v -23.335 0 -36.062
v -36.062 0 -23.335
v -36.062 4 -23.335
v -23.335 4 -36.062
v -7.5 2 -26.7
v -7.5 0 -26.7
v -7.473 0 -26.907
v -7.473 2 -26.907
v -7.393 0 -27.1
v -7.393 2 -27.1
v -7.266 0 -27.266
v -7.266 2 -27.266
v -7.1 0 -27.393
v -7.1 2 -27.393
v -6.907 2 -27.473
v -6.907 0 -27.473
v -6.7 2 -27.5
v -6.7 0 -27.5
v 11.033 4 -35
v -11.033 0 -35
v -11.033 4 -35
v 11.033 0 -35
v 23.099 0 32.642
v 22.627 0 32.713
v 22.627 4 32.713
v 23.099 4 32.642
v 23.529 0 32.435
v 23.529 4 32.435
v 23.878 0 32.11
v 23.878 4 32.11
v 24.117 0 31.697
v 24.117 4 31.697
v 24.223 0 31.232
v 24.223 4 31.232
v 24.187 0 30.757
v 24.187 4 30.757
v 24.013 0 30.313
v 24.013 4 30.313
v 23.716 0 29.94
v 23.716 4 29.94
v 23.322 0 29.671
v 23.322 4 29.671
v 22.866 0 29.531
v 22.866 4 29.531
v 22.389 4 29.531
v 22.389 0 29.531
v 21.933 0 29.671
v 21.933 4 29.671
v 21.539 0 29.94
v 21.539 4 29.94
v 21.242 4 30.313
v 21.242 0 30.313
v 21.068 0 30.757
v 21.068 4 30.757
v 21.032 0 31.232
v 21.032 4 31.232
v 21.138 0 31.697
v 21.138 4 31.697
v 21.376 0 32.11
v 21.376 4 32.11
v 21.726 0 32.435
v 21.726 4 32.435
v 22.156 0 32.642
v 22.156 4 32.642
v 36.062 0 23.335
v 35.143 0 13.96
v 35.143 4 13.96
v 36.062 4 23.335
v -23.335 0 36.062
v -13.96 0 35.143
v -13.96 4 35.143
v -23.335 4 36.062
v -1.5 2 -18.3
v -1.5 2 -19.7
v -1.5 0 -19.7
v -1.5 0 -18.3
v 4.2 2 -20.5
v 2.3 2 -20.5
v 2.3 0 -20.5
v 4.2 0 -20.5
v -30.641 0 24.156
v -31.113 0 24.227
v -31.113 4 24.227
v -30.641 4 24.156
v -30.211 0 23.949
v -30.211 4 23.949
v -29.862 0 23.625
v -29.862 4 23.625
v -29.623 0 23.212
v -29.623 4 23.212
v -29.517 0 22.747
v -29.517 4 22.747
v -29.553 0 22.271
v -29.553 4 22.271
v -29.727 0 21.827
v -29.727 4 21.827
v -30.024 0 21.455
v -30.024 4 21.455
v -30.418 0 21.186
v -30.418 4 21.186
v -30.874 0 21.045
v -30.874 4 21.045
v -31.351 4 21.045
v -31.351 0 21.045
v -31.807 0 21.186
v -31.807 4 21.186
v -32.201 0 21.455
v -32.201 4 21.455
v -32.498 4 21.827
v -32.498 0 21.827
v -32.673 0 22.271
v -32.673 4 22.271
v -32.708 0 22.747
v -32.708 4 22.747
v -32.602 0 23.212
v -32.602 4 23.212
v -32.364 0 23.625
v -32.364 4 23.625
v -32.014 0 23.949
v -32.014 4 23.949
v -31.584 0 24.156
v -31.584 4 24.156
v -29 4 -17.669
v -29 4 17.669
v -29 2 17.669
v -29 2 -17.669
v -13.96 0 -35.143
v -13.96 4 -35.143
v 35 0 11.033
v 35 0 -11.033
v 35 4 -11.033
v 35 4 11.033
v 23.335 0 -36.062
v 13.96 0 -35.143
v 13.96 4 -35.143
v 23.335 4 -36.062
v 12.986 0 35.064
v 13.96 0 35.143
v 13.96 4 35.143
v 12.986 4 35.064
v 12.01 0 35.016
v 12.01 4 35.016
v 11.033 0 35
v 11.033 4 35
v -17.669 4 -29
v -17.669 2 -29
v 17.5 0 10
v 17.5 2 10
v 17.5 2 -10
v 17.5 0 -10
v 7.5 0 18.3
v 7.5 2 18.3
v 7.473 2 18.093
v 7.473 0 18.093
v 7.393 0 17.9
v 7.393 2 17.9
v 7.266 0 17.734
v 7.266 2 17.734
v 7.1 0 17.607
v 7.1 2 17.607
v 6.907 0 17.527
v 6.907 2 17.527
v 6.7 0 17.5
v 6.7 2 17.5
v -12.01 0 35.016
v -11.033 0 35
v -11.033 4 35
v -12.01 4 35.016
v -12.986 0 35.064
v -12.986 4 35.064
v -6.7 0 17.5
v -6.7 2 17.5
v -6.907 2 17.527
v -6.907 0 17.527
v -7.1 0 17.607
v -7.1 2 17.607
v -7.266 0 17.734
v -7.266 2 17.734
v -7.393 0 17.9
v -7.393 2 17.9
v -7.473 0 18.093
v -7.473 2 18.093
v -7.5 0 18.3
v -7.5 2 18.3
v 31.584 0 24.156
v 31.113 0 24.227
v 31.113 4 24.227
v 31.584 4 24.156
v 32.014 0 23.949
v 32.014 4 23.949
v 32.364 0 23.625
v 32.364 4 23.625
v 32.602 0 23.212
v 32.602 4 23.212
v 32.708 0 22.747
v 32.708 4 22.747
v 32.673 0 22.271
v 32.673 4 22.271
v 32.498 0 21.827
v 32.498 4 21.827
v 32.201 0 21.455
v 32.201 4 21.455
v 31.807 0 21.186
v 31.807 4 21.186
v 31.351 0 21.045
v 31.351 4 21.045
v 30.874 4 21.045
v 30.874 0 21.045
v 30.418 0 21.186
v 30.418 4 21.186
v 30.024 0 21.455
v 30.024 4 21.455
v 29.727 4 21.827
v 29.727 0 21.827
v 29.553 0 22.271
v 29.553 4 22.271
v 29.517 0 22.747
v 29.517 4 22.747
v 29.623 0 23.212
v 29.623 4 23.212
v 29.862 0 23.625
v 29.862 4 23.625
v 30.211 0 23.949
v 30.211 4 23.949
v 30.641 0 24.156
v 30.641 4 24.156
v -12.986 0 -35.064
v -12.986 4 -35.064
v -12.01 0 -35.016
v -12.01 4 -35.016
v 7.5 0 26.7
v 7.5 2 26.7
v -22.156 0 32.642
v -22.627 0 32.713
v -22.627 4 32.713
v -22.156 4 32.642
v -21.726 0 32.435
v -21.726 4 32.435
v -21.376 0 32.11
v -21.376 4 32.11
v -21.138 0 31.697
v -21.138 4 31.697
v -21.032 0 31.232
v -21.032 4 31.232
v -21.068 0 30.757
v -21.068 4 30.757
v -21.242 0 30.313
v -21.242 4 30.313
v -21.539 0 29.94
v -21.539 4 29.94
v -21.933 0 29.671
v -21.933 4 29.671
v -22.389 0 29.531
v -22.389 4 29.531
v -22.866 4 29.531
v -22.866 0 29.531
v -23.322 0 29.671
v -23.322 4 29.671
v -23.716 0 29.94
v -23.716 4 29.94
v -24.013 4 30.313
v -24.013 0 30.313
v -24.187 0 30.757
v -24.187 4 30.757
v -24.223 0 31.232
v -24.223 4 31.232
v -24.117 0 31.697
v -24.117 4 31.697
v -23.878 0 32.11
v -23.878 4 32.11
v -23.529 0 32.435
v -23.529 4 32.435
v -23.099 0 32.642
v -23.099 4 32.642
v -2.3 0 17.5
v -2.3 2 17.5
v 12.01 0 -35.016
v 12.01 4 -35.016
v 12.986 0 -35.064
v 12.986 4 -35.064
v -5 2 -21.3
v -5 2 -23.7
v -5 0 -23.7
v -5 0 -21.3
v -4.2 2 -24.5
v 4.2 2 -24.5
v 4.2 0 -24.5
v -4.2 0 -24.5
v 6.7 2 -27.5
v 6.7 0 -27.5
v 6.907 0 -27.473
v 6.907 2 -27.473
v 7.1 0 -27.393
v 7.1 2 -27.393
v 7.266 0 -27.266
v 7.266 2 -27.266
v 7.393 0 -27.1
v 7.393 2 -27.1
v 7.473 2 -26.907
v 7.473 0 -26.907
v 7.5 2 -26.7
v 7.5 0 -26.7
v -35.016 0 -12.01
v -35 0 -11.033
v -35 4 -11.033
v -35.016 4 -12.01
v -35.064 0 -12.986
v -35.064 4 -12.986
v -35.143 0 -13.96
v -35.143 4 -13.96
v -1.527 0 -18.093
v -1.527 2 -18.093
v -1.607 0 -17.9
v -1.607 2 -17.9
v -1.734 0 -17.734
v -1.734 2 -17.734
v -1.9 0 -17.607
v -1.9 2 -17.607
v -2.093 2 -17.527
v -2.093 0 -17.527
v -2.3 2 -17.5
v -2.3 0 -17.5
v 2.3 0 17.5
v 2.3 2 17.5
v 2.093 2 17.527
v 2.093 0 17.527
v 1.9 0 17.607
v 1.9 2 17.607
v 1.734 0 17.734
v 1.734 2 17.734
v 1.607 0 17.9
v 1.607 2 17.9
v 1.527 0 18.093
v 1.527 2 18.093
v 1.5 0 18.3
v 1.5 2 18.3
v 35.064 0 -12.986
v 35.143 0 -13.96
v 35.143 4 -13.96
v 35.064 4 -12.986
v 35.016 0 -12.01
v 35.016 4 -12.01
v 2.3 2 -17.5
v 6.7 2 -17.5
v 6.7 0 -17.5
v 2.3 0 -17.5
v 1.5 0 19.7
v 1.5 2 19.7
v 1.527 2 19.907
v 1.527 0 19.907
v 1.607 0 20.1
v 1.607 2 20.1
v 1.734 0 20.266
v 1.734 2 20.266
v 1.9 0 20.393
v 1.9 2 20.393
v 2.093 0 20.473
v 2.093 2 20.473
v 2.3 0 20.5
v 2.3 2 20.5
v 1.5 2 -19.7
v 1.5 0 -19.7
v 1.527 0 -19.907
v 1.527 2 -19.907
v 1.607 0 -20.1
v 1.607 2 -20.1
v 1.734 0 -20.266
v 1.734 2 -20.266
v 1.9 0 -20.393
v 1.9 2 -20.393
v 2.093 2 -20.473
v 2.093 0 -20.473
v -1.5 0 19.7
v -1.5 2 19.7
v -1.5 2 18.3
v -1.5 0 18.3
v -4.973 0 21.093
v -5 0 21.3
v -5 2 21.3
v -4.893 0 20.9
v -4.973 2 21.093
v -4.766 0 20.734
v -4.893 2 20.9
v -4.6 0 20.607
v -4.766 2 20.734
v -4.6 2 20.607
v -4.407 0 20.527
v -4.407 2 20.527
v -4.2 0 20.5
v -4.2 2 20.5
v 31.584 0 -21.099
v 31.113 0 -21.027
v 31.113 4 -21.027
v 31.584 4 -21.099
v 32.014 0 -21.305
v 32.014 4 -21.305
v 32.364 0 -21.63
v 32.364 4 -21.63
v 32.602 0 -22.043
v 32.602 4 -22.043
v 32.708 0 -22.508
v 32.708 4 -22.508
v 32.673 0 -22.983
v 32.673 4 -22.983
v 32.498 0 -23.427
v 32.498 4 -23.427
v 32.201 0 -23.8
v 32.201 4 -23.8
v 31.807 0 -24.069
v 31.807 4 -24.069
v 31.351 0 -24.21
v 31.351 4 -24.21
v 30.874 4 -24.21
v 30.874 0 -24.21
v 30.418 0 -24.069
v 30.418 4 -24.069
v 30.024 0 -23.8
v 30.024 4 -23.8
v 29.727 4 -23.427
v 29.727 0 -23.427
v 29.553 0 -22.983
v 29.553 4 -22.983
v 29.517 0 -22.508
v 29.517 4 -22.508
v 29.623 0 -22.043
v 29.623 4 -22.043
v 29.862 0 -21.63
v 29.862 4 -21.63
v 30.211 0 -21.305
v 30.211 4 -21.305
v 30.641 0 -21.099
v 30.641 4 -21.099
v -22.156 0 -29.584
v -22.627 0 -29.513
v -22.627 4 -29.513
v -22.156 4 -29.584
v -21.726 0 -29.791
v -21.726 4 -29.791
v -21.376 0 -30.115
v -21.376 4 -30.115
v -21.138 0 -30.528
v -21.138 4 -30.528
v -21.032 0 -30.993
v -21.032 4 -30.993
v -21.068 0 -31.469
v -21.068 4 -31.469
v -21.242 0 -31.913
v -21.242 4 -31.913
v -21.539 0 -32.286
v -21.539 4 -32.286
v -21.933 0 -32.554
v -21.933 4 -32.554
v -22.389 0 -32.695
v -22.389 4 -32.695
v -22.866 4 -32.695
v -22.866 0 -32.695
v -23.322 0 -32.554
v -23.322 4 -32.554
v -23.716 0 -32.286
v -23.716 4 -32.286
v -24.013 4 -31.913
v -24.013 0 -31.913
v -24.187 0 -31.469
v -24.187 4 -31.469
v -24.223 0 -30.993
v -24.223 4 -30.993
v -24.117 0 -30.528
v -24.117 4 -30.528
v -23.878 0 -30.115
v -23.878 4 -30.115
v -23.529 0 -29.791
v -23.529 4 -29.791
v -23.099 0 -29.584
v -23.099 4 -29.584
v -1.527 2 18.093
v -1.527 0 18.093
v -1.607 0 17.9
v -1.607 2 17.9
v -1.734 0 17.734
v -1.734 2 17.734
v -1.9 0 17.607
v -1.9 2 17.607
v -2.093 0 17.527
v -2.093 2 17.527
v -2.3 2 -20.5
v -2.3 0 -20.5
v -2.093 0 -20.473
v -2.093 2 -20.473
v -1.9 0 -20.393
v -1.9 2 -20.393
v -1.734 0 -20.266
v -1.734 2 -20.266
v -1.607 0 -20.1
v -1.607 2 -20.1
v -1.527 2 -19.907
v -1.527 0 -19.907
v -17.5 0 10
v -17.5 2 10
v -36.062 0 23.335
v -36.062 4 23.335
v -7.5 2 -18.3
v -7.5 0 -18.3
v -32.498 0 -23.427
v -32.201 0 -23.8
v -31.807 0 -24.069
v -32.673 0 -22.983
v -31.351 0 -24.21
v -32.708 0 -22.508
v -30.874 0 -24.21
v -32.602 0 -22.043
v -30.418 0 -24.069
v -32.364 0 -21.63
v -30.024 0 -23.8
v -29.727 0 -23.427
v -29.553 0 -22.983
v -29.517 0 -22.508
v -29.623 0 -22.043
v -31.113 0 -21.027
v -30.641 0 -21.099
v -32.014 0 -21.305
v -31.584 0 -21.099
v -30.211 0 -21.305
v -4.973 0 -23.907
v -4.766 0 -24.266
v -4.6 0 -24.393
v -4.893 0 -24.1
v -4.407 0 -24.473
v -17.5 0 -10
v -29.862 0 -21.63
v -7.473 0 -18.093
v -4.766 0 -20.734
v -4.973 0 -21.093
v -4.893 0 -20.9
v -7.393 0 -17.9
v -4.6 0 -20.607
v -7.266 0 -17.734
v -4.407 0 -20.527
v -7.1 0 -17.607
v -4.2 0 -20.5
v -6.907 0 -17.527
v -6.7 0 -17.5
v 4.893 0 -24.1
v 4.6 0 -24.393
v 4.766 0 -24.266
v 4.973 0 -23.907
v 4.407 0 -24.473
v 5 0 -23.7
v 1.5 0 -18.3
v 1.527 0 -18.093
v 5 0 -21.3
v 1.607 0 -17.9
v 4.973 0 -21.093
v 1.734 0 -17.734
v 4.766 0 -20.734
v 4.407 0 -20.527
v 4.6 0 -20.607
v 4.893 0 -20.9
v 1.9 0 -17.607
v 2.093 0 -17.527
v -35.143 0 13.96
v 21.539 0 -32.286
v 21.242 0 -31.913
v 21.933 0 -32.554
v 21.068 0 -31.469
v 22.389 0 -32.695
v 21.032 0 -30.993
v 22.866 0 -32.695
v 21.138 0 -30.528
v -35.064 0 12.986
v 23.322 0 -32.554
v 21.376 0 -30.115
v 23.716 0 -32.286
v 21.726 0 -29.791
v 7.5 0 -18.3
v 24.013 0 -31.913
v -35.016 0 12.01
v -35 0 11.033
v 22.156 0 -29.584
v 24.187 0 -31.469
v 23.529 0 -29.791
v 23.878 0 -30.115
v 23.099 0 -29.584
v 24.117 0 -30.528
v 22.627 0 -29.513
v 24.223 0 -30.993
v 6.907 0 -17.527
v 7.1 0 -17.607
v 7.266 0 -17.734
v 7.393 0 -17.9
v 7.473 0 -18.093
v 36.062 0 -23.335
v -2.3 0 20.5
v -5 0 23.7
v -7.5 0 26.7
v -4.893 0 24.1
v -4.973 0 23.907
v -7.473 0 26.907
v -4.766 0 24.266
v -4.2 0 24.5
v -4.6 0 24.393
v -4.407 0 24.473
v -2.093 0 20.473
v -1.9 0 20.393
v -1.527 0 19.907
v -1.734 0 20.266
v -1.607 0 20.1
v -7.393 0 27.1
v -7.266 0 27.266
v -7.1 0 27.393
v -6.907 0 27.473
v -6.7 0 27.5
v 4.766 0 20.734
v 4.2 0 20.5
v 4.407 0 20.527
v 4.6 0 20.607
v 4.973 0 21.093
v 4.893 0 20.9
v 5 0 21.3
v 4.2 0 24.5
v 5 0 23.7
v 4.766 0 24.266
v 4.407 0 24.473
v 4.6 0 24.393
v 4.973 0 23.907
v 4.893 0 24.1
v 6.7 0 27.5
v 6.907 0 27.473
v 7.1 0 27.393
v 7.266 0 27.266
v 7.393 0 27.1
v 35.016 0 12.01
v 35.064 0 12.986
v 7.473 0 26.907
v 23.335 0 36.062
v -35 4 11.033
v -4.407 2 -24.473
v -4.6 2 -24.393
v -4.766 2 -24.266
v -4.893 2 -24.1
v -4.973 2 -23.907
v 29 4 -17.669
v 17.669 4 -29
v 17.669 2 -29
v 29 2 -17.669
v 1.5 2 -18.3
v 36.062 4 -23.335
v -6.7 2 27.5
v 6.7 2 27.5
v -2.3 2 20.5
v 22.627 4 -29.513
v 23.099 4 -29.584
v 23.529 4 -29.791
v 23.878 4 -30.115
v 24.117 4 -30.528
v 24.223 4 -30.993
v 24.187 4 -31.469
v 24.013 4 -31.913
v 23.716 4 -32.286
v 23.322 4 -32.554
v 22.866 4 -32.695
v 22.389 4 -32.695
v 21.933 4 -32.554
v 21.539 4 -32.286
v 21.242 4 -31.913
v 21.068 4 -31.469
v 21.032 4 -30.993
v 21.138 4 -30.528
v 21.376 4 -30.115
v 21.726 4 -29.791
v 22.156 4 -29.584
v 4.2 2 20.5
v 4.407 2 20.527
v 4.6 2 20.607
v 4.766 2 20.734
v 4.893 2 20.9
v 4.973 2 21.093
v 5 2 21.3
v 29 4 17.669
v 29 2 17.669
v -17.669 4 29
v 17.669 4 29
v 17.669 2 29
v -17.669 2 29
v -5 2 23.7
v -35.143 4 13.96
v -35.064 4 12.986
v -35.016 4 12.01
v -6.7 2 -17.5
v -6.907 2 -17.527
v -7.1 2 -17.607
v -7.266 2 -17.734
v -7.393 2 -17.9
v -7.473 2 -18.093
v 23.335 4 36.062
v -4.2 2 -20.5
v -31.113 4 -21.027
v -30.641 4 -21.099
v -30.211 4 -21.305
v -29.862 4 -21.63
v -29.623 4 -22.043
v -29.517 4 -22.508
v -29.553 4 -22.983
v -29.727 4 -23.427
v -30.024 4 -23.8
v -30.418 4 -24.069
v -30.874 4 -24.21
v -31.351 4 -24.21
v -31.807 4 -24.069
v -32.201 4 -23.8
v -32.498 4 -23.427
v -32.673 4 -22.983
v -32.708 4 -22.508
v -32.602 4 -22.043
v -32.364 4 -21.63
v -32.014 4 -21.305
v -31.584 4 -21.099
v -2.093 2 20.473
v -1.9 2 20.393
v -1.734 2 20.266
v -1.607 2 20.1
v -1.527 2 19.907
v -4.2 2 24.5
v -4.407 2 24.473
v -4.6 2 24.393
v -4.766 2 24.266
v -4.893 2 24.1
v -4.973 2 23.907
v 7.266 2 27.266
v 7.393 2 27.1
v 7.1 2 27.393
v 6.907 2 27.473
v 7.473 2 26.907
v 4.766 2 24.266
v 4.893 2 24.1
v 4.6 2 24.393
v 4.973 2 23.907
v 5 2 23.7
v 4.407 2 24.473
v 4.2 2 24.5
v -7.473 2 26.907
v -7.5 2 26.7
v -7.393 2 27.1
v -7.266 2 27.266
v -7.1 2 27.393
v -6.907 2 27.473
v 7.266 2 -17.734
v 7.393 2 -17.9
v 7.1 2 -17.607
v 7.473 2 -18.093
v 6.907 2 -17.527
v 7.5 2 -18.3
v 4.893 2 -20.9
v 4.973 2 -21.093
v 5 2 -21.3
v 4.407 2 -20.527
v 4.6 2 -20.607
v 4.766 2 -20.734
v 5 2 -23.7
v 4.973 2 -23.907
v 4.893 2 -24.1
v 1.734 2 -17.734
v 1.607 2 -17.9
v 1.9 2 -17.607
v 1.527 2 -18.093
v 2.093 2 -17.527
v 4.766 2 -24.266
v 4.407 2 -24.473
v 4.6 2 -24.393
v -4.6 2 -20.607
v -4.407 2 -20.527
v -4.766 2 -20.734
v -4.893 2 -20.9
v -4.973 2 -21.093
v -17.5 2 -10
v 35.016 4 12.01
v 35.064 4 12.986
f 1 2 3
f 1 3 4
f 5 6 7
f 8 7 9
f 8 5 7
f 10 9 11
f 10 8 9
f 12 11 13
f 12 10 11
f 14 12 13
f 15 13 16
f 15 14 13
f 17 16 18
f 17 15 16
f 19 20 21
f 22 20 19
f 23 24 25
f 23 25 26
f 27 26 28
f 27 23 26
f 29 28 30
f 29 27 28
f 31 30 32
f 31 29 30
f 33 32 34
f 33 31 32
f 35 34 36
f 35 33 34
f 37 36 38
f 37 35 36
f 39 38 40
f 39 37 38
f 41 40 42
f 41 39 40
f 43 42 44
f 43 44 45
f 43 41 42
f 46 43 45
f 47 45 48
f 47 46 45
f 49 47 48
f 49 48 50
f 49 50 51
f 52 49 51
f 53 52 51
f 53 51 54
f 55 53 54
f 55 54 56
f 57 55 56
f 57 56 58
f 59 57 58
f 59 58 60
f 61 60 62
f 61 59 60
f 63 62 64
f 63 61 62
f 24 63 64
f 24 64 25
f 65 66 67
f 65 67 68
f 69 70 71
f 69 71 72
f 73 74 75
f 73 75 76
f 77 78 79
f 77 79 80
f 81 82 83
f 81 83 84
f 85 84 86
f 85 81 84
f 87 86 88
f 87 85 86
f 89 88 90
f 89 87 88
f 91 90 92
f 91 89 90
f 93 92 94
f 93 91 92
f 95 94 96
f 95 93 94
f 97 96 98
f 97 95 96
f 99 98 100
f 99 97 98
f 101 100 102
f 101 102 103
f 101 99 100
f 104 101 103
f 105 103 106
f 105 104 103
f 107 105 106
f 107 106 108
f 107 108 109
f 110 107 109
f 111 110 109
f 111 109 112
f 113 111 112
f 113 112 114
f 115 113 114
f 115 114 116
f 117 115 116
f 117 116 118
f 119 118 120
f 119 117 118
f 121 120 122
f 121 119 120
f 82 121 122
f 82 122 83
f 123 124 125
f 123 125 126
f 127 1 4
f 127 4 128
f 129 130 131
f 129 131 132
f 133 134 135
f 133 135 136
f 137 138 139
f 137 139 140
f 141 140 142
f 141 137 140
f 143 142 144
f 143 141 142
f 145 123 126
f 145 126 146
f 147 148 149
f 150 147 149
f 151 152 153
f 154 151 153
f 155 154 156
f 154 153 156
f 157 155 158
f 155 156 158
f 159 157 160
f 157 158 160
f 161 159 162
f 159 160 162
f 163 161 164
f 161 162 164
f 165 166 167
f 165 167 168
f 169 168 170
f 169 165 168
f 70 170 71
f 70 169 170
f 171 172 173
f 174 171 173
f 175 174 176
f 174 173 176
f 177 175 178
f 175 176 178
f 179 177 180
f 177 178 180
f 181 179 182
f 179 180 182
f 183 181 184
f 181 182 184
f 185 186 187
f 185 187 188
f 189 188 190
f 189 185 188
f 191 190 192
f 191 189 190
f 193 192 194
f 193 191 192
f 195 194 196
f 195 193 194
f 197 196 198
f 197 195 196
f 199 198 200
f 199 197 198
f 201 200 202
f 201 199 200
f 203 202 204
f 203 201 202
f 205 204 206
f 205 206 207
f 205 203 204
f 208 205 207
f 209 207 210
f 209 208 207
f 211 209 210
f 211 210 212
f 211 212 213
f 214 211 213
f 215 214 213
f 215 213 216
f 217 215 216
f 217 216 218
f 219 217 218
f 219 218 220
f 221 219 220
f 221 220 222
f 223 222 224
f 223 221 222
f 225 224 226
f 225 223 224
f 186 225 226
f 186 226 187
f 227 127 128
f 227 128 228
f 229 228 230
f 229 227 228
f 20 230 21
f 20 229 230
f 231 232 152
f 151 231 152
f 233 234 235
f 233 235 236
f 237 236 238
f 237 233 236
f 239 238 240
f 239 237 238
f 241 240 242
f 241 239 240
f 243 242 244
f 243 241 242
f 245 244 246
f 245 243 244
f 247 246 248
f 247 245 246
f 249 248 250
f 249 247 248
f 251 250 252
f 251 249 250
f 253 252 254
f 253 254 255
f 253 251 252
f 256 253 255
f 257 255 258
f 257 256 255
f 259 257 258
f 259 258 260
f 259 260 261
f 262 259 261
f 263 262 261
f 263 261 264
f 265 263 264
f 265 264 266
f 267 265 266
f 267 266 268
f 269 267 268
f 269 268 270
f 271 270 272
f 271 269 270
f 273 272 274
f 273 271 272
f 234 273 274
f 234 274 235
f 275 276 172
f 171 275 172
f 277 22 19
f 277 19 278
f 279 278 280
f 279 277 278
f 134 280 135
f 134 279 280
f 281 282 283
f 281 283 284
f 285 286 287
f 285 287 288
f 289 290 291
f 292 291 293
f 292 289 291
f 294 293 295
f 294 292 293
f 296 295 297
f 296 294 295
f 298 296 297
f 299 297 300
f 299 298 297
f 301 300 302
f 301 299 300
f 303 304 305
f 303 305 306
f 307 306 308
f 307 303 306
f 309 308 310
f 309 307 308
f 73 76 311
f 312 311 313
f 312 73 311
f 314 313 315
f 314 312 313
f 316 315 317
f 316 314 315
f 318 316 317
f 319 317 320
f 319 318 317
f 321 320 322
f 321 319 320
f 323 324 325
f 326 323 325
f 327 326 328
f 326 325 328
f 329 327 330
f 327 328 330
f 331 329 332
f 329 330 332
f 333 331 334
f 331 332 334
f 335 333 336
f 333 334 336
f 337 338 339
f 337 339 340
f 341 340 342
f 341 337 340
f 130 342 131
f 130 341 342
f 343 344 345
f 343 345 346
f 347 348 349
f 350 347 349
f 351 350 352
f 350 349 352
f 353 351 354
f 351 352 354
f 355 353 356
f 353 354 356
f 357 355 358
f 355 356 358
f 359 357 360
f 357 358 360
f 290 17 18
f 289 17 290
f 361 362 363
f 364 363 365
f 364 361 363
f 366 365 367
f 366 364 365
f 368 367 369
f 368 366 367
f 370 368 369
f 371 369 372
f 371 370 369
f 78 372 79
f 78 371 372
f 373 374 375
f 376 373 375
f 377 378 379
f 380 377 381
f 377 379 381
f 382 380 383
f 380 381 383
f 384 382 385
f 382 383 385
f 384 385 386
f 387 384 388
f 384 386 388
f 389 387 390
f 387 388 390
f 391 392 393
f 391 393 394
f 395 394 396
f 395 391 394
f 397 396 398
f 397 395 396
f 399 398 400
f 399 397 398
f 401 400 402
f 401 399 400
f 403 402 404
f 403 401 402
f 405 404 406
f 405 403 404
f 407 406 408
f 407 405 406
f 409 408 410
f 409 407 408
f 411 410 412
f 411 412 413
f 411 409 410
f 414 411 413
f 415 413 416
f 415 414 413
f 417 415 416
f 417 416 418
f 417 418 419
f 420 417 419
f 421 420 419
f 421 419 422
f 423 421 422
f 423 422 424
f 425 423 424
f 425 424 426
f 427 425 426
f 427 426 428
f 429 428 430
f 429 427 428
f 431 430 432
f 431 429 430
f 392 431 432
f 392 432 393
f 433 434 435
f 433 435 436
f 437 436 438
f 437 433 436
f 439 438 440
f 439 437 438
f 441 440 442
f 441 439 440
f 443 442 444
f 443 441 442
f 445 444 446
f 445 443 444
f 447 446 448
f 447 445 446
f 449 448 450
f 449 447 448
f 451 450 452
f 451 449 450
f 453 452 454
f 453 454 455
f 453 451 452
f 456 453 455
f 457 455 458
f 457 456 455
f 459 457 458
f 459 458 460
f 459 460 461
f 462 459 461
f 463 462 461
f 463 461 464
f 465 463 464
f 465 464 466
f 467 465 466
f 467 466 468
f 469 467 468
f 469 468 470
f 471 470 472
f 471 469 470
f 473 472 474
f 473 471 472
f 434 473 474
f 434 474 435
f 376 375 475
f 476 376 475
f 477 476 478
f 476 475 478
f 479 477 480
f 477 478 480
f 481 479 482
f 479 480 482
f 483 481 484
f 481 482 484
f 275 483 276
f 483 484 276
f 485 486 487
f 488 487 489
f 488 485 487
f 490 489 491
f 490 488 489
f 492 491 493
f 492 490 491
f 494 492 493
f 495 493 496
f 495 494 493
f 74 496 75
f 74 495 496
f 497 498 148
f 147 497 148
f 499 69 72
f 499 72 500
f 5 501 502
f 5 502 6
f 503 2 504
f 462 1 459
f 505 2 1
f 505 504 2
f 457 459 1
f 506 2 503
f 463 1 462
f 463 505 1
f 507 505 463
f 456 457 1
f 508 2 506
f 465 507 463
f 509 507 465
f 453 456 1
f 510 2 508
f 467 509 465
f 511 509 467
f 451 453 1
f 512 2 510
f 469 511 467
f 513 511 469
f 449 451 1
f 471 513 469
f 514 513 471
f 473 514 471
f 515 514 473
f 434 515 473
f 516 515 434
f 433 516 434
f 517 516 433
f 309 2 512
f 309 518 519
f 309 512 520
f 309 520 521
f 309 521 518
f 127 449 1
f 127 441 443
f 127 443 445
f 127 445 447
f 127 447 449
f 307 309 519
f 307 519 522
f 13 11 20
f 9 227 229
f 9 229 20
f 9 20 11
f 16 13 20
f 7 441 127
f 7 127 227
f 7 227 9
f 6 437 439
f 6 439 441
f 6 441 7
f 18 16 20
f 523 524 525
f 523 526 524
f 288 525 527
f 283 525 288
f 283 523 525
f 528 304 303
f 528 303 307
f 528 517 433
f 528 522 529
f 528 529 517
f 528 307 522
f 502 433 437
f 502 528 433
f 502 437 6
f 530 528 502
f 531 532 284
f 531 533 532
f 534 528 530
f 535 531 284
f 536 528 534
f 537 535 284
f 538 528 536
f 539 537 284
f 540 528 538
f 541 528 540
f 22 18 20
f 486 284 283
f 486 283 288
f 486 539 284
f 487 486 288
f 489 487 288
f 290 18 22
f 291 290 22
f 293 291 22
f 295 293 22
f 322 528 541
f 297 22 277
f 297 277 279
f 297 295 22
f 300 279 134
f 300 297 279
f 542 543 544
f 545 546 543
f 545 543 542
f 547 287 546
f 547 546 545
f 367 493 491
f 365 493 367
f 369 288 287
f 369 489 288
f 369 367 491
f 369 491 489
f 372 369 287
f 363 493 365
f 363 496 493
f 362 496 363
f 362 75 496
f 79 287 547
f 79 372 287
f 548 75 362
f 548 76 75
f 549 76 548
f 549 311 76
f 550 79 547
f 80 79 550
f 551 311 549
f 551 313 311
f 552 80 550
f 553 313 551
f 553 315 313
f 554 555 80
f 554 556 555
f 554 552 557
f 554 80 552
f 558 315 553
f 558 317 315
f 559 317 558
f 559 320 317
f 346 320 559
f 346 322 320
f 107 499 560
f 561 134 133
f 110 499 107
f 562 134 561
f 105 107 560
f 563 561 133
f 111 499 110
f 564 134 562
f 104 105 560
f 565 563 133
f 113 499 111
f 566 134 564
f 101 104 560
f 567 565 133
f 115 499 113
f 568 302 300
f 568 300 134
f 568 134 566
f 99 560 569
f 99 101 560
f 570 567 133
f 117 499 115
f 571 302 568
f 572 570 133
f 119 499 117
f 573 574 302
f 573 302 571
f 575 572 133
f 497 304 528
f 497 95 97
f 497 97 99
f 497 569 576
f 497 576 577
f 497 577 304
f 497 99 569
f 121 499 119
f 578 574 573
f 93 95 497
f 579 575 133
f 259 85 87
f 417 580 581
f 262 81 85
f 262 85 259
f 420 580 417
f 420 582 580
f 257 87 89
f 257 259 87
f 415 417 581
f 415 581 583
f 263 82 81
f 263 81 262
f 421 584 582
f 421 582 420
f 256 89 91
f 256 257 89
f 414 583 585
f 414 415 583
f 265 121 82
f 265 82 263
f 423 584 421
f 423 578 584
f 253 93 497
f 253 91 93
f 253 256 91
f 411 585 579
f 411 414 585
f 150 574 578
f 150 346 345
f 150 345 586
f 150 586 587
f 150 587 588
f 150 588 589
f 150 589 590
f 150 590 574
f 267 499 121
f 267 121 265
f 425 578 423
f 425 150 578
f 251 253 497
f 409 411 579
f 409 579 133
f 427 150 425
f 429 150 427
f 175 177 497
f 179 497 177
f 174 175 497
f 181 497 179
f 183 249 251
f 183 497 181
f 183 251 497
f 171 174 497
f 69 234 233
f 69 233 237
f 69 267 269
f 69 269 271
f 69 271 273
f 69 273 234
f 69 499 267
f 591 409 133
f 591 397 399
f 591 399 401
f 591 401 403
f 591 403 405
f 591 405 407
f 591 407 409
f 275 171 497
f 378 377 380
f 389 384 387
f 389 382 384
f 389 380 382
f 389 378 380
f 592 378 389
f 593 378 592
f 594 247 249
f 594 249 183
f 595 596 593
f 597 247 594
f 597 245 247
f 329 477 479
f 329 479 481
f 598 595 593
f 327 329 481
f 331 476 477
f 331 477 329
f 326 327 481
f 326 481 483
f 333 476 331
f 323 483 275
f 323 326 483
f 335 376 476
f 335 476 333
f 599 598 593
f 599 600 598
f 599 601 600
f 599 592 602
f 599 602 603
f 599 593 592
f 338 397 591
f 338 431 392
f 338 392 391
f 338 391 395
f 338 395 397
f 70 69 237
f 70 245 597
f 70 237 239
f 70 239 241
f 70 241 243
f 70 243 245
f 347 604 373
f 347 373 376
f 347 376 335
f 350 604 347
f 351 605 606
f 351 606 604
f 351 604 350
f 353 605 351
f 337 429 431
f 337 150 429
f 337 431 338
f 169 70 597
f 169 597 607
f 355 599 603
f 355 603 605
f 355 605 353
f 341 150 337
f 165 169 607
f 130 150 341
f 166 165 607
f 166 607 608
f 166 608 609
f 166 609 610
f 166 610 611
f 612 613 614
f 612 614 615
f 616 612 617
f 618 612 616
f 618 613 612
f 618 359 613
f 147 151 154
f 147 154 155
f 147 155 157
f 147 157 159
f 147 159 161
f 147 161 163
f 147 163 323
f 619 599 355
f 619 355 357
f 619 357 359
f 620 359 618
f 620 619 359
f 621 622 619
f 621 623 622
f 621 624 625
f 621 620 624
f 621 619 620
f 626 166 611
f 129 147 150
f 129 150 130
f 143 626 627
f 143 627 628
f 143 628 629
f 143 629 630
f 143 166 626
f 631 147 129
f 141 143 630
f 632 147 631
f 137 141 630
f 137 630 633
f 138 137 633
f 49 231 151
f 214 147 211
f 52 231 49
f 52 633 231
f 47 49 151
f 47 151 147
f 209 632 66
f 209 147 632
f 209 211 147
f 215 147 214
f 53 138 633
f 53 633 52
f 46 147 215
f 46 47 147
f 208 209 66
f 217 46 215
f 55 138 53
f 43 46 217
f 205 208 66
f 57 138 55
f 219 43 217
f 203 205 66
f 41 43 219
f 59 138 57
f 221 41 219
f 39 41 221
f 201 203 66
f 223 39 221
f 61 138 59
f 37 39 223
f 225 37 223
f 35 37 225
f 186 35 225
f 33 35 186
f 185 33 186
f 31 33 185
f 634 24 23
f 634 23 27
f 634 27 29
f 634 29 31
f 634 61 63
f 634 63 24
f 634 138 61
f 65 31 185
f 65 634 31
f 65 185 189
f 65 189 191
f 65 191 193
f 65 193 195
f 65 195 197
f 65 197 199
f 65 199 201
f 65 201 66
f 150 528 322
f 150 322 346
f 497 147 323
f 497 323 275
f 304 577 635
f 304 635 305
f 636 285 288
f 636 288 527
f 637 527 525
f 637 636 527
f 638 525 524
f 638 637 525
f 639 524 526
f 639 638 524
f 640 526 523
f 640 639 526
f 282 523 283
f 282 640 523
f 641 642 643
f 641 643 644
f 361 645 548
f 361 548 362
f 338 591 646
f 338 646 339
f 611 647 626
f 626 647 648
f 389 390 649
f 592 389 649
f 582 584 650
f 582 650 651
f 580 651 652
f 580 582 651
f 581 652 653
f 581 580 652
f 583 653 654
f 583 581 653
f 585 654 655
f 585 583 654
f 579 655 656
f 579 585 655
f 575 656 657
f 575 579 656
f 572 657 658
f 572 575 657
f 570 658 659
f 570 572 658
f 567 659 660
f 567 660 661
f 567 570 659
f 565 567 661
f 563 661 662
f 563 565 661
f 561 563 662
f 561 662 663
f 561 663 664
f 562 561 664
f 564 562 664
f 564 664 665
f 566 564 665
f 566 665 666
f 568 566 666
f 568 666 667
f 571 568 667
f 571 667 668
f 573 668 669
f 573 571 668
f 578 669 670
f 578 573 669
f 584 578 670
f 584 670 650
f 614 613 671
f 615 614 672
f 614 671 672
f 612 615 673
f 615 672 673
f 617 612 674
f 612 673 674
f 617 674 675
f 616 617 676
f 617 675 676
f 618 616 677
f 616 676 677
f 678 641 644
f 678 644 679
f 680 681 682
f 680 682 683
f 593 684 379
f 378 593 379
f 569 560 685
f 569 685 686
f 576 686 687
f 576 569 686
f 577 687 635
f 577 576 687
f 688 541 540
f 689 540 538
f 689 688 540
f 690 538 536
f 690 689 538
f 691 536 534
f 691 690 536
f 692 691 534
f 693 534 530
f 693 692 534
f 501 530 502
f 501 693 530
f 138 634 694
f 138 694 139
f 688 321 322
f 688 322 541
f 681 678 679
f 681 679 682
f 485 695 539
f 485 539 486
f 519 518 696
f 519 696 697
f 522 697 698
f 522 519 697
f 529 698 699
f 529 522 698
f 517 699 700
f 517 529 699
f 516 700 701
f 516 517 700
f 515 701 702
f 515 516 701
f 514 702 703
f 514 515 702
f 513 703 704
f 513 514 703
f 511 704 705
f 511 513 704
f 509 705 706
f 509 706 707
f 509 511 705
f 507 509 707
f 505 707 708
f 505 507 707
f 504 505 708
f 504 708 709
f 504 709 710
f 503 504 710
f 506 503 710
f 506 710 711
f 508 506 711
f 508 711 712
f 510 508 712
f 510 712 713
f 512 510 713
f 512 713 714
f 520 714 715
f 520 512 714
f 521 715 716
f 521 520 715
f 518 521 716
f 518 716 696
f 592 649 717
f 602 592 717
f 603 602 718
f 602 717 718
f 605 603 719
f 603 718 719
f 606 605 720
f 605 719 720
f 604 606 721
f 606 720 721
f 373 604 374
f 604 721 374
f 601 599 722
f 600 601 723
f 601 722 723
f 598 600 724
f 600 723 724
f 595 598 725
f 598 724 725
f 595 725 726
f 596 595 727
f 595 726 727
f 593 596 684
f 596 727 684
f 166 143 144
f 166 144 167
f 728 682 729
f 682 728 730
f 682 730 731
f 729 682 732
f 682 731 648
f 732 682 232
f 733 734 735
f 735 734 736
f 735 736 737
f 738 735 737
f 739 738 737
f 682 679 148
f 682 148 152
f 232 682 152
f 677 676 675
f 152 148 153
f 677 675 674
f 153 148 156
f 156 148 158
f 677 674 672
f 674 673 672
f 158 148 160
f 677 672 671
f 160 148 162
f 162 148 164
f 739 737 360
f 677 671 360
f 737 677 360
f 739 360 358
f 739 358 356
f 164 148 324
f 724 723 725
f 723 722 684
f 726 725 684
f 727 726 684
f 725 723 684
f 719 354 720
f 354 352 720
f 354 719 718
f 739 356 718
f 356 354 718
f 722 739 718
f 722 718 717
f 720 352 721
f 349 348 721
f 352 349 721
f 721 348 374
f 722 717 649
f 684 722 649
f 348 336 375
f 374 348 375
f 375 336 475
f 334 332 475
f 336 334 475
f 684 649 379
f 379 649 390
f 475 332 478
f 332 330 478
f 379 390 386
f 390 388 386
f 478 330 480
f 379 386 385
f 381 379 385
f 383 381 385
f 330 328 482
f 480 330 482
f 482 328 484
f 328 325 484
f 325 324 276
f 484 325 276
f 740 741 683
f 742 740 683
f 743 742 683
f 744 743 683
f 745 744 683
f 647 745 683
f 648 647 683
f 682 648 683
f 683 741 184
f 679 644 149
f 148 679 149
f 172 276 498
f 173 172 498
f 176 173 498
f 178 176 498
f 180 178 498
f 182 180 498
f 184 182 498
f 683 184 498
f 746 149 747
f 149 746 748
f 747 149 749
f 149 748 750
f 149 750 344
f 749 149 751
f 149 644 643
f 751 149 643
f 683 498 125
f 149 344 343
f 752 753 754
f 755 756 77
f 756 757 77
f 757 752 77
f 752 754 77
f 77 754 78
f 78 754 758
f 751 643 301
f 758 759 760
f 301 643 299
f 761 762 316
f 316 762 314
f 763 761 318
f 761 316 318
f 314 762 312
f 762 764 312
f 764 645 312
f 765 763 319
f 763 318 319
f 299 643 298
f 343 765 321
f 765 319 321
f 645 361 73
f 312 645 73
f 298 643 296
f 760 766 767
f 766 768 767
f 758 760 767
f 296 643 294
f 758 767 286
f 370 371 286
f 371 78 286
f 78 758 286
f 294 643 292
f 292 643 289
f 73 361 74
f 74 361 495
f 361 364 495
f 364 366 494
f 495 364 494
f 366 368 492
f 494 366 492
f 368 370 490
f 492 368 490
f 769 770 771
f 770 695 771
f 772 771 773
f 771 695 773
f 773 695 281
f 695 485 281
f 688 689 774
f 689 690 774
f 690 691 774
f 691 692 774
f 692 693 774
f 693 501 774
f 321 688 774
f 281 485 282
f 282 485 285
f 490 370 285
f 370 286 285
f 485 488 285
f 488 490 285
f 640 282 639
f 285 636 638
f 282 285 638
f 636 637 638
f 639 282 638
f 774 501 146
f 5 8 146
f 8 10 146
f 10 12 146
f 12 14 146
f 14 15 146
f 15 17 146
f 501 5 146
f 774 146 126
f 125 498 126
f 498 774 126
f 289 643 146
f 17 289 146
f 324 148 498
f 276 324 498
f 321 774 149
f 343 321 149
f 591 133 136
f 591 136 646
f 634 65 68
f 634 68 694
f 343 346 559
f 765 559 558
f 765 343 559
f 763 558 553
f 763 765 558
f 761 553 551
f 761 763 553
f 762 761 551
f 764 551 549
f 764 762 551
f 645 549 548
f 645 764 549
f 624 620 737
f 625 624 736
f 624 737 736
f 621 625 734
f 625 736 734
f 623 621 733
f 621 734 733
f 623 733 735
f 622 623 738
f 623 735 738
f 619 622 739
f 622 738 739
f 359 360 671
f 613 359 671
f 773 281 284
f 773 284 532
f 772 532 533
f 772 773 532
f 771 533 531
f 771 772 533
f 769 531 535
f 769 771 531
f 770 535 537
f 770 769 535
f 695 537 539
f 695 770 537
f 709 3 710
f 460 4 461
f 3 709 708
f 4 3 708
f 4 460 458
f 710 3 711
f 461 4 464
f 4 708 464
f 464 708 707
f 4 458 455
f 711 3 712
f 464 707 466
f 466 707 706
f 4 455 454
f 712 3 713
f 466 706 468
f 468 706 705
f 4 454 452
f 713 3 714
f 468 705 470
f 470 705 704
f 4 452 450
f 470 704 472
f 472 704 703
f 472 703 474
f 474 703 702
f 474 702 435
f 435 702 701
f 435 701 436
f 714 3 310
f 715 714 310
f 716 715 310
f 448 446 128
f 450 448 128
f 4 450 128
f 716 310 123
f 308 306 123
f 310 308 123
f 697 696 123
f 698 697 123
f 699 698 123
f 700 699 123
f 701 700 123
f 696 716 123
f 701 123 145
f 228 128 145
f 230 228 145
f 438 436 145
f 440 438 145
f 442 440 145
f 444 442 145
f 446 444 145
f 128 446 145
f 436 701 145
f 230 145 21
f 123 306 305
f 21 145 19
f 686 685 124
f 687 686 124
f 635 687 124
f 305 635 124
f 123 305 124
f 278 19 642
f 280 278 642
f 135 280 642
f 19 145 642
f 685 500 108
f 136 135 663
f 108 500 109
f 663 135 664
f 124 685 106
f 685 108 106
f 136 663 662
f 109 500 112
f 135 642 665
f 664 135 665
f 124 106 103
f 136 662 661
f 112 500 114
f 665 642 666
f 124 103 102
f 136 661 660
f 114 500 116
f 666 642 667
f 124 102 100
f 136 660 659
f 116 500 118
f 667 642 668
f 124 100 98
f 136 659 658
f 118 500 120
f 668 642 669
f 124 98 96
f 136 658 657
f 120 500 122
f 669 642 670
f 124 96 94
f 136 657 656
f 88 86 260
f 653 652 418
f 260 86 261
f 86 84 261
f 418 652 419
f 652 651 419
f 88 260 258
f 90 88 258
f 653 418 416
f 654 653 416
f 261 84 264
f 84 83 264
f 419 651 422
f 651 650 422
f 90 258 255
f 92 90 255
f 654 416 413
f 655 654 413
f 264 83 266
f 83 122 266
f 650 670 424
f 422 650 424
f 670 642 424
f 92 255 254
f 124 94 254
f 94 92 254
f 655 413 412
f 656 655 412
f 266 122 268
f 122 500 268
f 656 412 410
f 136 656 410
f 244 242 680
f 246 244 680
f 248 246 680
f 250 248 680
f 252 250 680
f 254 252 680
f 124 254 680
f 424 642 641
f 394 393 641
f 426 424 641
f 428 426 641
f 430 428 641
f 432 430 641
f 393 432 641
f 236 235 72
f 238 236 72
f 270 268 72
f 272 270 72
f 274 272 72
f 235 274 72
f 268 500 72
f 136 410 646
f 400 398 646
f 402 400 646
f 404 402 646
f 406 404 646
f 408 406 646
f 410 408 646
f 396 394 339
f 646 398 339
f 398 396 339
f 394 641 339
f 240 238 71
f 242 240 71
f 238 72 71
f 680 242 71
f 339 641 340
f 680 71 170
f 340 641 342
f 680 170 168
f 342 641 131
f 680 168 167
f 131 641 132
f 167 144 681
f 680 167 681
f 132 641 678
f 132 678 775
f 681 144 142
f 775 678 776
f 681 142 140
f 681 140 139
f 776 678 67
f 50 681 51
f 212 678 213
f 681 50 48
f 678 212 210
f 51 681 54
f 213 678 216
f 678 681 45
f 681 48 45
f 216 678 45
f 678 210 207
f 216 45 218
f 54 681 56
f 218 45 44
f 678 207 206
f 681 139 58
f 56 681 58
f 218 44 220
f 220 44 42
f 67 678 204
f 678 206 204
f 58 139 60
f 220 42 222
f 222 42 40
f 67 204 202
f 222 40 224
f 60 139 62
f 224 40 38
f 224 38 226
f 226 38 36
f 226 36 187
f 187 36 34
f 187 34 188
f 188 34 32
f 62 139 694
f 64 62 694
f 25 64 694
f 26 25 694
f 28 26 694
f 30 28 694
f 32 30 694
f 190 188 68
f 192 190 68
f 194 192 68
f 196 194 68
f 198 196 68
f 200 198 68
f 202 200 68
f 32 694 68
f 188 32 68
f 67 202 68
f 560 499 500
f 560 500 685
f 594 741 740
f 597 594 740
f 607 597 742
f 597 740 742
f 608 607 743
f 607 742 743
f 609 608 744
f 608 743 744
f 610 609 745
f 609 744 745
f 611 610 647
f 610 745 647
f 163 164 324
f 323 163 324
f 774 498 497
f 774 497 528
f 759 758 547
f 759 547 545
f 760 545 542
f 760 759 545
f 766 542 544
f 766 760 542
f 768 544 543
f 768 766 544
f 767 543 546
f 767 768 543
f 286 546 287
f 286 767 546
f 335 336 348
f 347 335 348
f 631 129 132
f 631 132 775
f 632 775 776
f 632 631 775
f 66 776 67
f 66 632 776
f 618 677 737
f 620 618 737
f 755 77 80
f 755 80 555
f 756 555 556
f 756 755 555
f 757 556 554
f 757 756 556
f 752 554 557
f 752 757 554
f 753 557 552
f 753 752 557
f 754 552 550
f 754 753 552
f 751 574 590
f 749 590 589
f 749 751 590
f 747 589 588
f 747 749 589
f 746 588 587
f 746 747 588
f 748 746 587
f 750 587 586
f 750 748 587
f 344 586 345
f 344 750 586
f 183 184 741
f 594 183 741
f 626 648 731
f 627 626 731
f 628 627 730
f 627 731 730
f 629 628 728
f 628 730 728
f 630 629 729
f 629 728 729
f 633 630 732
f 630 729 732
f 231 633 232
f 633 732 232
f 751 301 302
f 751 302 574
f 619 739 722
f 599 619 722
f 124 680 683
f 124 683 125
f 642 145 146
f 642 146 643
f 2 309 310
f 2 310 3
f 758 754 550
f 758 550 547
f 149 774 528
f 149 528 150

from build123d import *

# Parameters (mm, degrees)
SKETCH1_R           = 1.6
BOSS_EXTRUDE1_DEPTH = 4
CUT_EXTRUDE1_DEPTH  = 2
FILLET2_R           = 30
CUT_EXTRUDE5_DEPTH  = 52.039200621
SKETCH7_W           = 35
SKETCH7_H           = 20
CUT_EXTRUDE6_DEPTH  = 52.039200621


with BuildPart() as part:
    # Sketch1 → Boss-Extrude1 (new body)
    with BuildSketch(Plane(origin=(0, 0, 0), x_dir=(1, 0, 0), z_dir=(0, 1, 0))):
        Polygon((-12.5, 35), (12.5, 35), (23.334523779, 36.062445841), (36.062445841, 23.334523779), (35, 12.5), (35, -12.5), (36.062445841, -23.334523779), (23.334523779, -36.062445841), (12.5, -35), (-12.5, -35), (-23.334523779, -36.062445841), (-36.06244584, -23.334523779), (-35, -12.5), (-35, 12.5), (-36.062445841, 23.334523779), (-23.334523779, 36.062445841), align=None)
        with Locations(Location((22.627416998, 31.112698372, 0), (0, 0, 270))):
            Circle(SKETCH1_R, mode=Mode.SUBTRACT)
        with Locations(Location((31.112698372, 22.627416998, 0), (0, 0, 270))):
            Circle(SKETCH1_R, mode=Mode.SUBTRACT)
        with Locations(Location((22.627416998, -31.112698372, 0), (0, 0, 270))):
            Circle(SKETCH1_R, mode=Mode.SUBTRACT)
        with Locations(Location((31.112698372, -22.627416998, 0), (0, 0, 270))):
            Circle(SKETCH1_R, mode=Mode.SUBTRACT)
        with Locations(Location((-31.112698372, -22.627416998, 0), (0, 0, 270))):
            Circle(SKETCH1_R, mode=Mode.SUBTRACT)
        with Locations(Location((-22.627416998, -31.112698372, 0), (0, 0, 270))):
            Circle(SKETCH1_R, mode=Mode.SUBTRACT)
        with Locations(Location((-22.627416998, 31.112698372, 0), (0, 0, 270))):
            Circle(SKETCH1_R, mode=Mode.SUBTRACT)
        with Locations(Location((-31.112698372, 22.627416998, 0), (0, 0, 270))):
            Circle(SKETCH1_R, mode=Mode.SUBTRACT)
    extrude(amount=BOSS_EXTRUDE1_DEPTH)

    # Sketch2 → Cut-Extrude1 (cut)
    with BuildSketch(Plane(origin=(0, 4, 0), x_dir=(1, 0, 0), z_dir=(0, 1, 0))):
        Polygon((-17.669047558, 29), (17.669047558, 29), (29, 17.669047558), (29, -17.669047558), (17.669047558, -29), (-17.669047558, -29), (-29, -17.669047558), (-29, 17.669047558), align=None)
    extrude(amount=-CUT_EXTRUDE1_DEPTH, mode=Mode.SUBTRACT)

    # Fillet2
    # the kernel refuses this fillet: 30 mm, written as the material it adds along each edge
    with BuildSketch(Plane(origin=(-12.5, 0, -35), x_dir=(1, 0, 0), z_dir=(0, 1, 0))) as fillet2_piece_1:
        with BuildLine():
            CenterArc((FILLET2_R * 0.0489132680017, FILLET2_R), FILLET2_R, 264.399415997, 5.600584003)
            Line((-FILLET2_R * 0.0486797758843, FILLET2_R * 0.00477359471069), (0, 0))
            Line((0, 0), (FILLET2_R * 0.0489132680017, 0))
        make_face()
    extrude(amount=4)
    with BuildSketch(Plane(origin=(12.5, 0, -35), x_dir=(-1, 0, 0), z_dir=(0, 1, 0)), Plane(origin=(35, 0, -12.5), x_dir=(0.09759304388595028, 0, -0.9952264052893065), z_dir=(0, 1, 0)), Plane(origin=(35, 0, 12.5), x_dir=(0, 0, -1), z_dir=(0, 1, 0)), Plane(origin=(12.5, 0, 35), x_dir=(0.9952264052893073, 0, 0.09759304388594116), z_dir=(0, 1, 0)), Plane(origin=(-12.5, 0, 35), x_dir=(1, 0, 0), z_dir=(0, 1, 0)), Plane(origin=(-35, 0, 12.5), x_dir=(-0.09759304388594536, 0, 0.995226405289307), z_dir=(0, 1, 0)), Plane(origin=(-35, 0, -12.5), x_dir=(0, 0, 1), z_dir=(0, 1, 0))) as fillet2_piece_2:
        with BuildLine():
            CenterArc((FILLET2_R * 0.048913268002, -FILLET2_R), FILLET2_R, 90, 5.600584003)
            Line((-FILLET2_R * 0.0486797758846, -FILLET2_R * 0.00477359471075), (0, 0))
            Line((0, 0), (FILLET2_R * 0.048913268002, 0))
        make_face()
    extrude(amount=4)

    # Sketch6 → Cut-Extrude5 (cut, through all)
    with BuildSketch(Plane(origin=(0, 2, 0), x_dir=(1, 0, 0), z_dir=(0, 1, 0))):
        with BuildLine():
            Line((-1.5, 19.7), (-1.5, 18.3))
            ThreePointArc((-1.5, 18.3), (-1.734314575, 17.734314575), (-2.3, 17.5))
            Line((-2.3, 17.5), (-6.7, 17.5))
            ThreePointArc((-6.7, 17.5), (-7.265685425, 17.734314575), (-7.5, 18.3))
            Line((-7.5, 18.3), (-7.5, 26.7))
            ThreePointArc((-7.5, 26.7), (-7.265685425, 27.265685425), (-6.7, 27.5))
            Line((-6.7, 27.5), (6.7, 27.5))
            ThreePointArc((6.7, 27.5), (7.265685425, 27.265685425), (7.5, 26.7))
            Line((7.5, 26.7), (7.5, 18.3))
            ThreePointArc((7.5, 18.3), (7.265685425, 17.734314575), (6.7, 17.5))
            Line((6.7, 17.5), (2.3, 17.5))
            ThreePointArc((2.3, 17.5), (1.734314575, 17.734314575), (1.5, 18.3))
            Line((1.5, 18.3), (1.5, 19.7))
            ThreePointArc((1.5, 19.7), (1.734314575, 20.265685425), (2.3, 20.5))
            Line((2.3, 20.5), (4.2, 20.5))
            ThreePointArc((4.2, 20.5), (4.765685425, 20.734314575), (5, 21.3))
            Line((5, 21.3), (5, 23.7))
            ThreePointArc((5, 23.7), (4.765685425, 24.265685425), (4.2, 24.5))
            Line((4.2, 24.5), (-4.2, 24.5))
            ThreePointArc((-4.2, 24.5), (-4.765685425, 24.265685425), (-5, 23.7))
            Line((-5, 23.7), (-5, 21.3))
            ThreePointArc((-5, 21.3), (-4.765685425, 20.734314575), (-4.2, 20.5))
            Line((-4.2, 20.5), (-2.3, 20.5))
            ThreePointArc((-2.3, 20.5), (-1.734314575, 20.265685425), (-1.5, 19.7))
        make_face()
        with BuildLine():
            Line((-2.3, -17.5), (-6.7, -17.5))
            ThreePointArc((-6.7, -17.5), (-7.265685425, -17.734314575), (-7.5, -18.3))
            Line((-7.5, -18.3), (-7.5, -26.7))
            ThreePointArc((-7.5, -26.7), (-7.265685425, -27.265685425), (-6.7, -27.5))
            Line((-6.7, -27.5), (6.7, -27.5))
            ThreePointArc((6.7, -27.5), (7.265685425, -27.265685425), (7.5, -26.7))
            Line((7.5, -26.7), (7.5, -18.3))
            ThreePointArc((7.5, -18.3), (7.265685425, -17.734314575), (6.7, -17.5))
            Line((6.7, -17.5), (2.3, -17.5))
            ThreePointArc((2.3, -17.5), (1.734314575, -17.734314575), (1.5, -18.3))
            Line((1.5, -18.3), (1.5, -19.7))
            ThreePointArc((1.5, -19.7), (1.734314575, -20.265685425), (2.3, -20.5))
            Line((2.3, -20.5), (4.2, -20.5))
            ThreePointArc((4.2, -20.5), (4.765685425, -20.734314575), (5, -21.3))
            Line((5, -21.3), (5, -23.7))
            ThreePointArc((5, -23.7), (4.765685425, -24.265685425), (4.2, -24.5))
            Line((4.2, -24.5), (-4.2, -24.5))
            ThreePointArc((-4.2, -24.5), (-4.765685425, -24.265685425), (-5, -23.7))
            Line((-5, -23.7), (-5, -21.3))
            ThreePointArc((-5, -21.3), (-4.765685425, -20.734314575), (-4.2, -20.5))
            Line((-4.2, -20.5), (-2.3, -20.5))
            ThreePointArc((-2.3, -20.5), (-1.734314575, -20.265685425), (-1.5, -19.7))
            Line((-1.5, -19.7), (-1.5, -18.3))
            ThreePointArc((-1.5, -18.3), (-1.734314575, -17.734314575), (-2.3, -17.5))
        make_face()
    extrude(amount=-CUT_EXTRUDE5_DEPTH, mode=Mode.SUBTRACT)

    # Sketch7 → Cut-Extrude6 (cut, through all)
    with BuildSketch(Plane(origin=(0, 2, 0), x_dir=(1, 0, 0), z_dir=(0, 1, 0))):
        Rectangle(SKETCH7_W, SKETCH7_H)
    extrude(amount=-CUT_EXTRUDE6_DEPTH, mode=Mode.SUBTRACT)


solid = part.part
